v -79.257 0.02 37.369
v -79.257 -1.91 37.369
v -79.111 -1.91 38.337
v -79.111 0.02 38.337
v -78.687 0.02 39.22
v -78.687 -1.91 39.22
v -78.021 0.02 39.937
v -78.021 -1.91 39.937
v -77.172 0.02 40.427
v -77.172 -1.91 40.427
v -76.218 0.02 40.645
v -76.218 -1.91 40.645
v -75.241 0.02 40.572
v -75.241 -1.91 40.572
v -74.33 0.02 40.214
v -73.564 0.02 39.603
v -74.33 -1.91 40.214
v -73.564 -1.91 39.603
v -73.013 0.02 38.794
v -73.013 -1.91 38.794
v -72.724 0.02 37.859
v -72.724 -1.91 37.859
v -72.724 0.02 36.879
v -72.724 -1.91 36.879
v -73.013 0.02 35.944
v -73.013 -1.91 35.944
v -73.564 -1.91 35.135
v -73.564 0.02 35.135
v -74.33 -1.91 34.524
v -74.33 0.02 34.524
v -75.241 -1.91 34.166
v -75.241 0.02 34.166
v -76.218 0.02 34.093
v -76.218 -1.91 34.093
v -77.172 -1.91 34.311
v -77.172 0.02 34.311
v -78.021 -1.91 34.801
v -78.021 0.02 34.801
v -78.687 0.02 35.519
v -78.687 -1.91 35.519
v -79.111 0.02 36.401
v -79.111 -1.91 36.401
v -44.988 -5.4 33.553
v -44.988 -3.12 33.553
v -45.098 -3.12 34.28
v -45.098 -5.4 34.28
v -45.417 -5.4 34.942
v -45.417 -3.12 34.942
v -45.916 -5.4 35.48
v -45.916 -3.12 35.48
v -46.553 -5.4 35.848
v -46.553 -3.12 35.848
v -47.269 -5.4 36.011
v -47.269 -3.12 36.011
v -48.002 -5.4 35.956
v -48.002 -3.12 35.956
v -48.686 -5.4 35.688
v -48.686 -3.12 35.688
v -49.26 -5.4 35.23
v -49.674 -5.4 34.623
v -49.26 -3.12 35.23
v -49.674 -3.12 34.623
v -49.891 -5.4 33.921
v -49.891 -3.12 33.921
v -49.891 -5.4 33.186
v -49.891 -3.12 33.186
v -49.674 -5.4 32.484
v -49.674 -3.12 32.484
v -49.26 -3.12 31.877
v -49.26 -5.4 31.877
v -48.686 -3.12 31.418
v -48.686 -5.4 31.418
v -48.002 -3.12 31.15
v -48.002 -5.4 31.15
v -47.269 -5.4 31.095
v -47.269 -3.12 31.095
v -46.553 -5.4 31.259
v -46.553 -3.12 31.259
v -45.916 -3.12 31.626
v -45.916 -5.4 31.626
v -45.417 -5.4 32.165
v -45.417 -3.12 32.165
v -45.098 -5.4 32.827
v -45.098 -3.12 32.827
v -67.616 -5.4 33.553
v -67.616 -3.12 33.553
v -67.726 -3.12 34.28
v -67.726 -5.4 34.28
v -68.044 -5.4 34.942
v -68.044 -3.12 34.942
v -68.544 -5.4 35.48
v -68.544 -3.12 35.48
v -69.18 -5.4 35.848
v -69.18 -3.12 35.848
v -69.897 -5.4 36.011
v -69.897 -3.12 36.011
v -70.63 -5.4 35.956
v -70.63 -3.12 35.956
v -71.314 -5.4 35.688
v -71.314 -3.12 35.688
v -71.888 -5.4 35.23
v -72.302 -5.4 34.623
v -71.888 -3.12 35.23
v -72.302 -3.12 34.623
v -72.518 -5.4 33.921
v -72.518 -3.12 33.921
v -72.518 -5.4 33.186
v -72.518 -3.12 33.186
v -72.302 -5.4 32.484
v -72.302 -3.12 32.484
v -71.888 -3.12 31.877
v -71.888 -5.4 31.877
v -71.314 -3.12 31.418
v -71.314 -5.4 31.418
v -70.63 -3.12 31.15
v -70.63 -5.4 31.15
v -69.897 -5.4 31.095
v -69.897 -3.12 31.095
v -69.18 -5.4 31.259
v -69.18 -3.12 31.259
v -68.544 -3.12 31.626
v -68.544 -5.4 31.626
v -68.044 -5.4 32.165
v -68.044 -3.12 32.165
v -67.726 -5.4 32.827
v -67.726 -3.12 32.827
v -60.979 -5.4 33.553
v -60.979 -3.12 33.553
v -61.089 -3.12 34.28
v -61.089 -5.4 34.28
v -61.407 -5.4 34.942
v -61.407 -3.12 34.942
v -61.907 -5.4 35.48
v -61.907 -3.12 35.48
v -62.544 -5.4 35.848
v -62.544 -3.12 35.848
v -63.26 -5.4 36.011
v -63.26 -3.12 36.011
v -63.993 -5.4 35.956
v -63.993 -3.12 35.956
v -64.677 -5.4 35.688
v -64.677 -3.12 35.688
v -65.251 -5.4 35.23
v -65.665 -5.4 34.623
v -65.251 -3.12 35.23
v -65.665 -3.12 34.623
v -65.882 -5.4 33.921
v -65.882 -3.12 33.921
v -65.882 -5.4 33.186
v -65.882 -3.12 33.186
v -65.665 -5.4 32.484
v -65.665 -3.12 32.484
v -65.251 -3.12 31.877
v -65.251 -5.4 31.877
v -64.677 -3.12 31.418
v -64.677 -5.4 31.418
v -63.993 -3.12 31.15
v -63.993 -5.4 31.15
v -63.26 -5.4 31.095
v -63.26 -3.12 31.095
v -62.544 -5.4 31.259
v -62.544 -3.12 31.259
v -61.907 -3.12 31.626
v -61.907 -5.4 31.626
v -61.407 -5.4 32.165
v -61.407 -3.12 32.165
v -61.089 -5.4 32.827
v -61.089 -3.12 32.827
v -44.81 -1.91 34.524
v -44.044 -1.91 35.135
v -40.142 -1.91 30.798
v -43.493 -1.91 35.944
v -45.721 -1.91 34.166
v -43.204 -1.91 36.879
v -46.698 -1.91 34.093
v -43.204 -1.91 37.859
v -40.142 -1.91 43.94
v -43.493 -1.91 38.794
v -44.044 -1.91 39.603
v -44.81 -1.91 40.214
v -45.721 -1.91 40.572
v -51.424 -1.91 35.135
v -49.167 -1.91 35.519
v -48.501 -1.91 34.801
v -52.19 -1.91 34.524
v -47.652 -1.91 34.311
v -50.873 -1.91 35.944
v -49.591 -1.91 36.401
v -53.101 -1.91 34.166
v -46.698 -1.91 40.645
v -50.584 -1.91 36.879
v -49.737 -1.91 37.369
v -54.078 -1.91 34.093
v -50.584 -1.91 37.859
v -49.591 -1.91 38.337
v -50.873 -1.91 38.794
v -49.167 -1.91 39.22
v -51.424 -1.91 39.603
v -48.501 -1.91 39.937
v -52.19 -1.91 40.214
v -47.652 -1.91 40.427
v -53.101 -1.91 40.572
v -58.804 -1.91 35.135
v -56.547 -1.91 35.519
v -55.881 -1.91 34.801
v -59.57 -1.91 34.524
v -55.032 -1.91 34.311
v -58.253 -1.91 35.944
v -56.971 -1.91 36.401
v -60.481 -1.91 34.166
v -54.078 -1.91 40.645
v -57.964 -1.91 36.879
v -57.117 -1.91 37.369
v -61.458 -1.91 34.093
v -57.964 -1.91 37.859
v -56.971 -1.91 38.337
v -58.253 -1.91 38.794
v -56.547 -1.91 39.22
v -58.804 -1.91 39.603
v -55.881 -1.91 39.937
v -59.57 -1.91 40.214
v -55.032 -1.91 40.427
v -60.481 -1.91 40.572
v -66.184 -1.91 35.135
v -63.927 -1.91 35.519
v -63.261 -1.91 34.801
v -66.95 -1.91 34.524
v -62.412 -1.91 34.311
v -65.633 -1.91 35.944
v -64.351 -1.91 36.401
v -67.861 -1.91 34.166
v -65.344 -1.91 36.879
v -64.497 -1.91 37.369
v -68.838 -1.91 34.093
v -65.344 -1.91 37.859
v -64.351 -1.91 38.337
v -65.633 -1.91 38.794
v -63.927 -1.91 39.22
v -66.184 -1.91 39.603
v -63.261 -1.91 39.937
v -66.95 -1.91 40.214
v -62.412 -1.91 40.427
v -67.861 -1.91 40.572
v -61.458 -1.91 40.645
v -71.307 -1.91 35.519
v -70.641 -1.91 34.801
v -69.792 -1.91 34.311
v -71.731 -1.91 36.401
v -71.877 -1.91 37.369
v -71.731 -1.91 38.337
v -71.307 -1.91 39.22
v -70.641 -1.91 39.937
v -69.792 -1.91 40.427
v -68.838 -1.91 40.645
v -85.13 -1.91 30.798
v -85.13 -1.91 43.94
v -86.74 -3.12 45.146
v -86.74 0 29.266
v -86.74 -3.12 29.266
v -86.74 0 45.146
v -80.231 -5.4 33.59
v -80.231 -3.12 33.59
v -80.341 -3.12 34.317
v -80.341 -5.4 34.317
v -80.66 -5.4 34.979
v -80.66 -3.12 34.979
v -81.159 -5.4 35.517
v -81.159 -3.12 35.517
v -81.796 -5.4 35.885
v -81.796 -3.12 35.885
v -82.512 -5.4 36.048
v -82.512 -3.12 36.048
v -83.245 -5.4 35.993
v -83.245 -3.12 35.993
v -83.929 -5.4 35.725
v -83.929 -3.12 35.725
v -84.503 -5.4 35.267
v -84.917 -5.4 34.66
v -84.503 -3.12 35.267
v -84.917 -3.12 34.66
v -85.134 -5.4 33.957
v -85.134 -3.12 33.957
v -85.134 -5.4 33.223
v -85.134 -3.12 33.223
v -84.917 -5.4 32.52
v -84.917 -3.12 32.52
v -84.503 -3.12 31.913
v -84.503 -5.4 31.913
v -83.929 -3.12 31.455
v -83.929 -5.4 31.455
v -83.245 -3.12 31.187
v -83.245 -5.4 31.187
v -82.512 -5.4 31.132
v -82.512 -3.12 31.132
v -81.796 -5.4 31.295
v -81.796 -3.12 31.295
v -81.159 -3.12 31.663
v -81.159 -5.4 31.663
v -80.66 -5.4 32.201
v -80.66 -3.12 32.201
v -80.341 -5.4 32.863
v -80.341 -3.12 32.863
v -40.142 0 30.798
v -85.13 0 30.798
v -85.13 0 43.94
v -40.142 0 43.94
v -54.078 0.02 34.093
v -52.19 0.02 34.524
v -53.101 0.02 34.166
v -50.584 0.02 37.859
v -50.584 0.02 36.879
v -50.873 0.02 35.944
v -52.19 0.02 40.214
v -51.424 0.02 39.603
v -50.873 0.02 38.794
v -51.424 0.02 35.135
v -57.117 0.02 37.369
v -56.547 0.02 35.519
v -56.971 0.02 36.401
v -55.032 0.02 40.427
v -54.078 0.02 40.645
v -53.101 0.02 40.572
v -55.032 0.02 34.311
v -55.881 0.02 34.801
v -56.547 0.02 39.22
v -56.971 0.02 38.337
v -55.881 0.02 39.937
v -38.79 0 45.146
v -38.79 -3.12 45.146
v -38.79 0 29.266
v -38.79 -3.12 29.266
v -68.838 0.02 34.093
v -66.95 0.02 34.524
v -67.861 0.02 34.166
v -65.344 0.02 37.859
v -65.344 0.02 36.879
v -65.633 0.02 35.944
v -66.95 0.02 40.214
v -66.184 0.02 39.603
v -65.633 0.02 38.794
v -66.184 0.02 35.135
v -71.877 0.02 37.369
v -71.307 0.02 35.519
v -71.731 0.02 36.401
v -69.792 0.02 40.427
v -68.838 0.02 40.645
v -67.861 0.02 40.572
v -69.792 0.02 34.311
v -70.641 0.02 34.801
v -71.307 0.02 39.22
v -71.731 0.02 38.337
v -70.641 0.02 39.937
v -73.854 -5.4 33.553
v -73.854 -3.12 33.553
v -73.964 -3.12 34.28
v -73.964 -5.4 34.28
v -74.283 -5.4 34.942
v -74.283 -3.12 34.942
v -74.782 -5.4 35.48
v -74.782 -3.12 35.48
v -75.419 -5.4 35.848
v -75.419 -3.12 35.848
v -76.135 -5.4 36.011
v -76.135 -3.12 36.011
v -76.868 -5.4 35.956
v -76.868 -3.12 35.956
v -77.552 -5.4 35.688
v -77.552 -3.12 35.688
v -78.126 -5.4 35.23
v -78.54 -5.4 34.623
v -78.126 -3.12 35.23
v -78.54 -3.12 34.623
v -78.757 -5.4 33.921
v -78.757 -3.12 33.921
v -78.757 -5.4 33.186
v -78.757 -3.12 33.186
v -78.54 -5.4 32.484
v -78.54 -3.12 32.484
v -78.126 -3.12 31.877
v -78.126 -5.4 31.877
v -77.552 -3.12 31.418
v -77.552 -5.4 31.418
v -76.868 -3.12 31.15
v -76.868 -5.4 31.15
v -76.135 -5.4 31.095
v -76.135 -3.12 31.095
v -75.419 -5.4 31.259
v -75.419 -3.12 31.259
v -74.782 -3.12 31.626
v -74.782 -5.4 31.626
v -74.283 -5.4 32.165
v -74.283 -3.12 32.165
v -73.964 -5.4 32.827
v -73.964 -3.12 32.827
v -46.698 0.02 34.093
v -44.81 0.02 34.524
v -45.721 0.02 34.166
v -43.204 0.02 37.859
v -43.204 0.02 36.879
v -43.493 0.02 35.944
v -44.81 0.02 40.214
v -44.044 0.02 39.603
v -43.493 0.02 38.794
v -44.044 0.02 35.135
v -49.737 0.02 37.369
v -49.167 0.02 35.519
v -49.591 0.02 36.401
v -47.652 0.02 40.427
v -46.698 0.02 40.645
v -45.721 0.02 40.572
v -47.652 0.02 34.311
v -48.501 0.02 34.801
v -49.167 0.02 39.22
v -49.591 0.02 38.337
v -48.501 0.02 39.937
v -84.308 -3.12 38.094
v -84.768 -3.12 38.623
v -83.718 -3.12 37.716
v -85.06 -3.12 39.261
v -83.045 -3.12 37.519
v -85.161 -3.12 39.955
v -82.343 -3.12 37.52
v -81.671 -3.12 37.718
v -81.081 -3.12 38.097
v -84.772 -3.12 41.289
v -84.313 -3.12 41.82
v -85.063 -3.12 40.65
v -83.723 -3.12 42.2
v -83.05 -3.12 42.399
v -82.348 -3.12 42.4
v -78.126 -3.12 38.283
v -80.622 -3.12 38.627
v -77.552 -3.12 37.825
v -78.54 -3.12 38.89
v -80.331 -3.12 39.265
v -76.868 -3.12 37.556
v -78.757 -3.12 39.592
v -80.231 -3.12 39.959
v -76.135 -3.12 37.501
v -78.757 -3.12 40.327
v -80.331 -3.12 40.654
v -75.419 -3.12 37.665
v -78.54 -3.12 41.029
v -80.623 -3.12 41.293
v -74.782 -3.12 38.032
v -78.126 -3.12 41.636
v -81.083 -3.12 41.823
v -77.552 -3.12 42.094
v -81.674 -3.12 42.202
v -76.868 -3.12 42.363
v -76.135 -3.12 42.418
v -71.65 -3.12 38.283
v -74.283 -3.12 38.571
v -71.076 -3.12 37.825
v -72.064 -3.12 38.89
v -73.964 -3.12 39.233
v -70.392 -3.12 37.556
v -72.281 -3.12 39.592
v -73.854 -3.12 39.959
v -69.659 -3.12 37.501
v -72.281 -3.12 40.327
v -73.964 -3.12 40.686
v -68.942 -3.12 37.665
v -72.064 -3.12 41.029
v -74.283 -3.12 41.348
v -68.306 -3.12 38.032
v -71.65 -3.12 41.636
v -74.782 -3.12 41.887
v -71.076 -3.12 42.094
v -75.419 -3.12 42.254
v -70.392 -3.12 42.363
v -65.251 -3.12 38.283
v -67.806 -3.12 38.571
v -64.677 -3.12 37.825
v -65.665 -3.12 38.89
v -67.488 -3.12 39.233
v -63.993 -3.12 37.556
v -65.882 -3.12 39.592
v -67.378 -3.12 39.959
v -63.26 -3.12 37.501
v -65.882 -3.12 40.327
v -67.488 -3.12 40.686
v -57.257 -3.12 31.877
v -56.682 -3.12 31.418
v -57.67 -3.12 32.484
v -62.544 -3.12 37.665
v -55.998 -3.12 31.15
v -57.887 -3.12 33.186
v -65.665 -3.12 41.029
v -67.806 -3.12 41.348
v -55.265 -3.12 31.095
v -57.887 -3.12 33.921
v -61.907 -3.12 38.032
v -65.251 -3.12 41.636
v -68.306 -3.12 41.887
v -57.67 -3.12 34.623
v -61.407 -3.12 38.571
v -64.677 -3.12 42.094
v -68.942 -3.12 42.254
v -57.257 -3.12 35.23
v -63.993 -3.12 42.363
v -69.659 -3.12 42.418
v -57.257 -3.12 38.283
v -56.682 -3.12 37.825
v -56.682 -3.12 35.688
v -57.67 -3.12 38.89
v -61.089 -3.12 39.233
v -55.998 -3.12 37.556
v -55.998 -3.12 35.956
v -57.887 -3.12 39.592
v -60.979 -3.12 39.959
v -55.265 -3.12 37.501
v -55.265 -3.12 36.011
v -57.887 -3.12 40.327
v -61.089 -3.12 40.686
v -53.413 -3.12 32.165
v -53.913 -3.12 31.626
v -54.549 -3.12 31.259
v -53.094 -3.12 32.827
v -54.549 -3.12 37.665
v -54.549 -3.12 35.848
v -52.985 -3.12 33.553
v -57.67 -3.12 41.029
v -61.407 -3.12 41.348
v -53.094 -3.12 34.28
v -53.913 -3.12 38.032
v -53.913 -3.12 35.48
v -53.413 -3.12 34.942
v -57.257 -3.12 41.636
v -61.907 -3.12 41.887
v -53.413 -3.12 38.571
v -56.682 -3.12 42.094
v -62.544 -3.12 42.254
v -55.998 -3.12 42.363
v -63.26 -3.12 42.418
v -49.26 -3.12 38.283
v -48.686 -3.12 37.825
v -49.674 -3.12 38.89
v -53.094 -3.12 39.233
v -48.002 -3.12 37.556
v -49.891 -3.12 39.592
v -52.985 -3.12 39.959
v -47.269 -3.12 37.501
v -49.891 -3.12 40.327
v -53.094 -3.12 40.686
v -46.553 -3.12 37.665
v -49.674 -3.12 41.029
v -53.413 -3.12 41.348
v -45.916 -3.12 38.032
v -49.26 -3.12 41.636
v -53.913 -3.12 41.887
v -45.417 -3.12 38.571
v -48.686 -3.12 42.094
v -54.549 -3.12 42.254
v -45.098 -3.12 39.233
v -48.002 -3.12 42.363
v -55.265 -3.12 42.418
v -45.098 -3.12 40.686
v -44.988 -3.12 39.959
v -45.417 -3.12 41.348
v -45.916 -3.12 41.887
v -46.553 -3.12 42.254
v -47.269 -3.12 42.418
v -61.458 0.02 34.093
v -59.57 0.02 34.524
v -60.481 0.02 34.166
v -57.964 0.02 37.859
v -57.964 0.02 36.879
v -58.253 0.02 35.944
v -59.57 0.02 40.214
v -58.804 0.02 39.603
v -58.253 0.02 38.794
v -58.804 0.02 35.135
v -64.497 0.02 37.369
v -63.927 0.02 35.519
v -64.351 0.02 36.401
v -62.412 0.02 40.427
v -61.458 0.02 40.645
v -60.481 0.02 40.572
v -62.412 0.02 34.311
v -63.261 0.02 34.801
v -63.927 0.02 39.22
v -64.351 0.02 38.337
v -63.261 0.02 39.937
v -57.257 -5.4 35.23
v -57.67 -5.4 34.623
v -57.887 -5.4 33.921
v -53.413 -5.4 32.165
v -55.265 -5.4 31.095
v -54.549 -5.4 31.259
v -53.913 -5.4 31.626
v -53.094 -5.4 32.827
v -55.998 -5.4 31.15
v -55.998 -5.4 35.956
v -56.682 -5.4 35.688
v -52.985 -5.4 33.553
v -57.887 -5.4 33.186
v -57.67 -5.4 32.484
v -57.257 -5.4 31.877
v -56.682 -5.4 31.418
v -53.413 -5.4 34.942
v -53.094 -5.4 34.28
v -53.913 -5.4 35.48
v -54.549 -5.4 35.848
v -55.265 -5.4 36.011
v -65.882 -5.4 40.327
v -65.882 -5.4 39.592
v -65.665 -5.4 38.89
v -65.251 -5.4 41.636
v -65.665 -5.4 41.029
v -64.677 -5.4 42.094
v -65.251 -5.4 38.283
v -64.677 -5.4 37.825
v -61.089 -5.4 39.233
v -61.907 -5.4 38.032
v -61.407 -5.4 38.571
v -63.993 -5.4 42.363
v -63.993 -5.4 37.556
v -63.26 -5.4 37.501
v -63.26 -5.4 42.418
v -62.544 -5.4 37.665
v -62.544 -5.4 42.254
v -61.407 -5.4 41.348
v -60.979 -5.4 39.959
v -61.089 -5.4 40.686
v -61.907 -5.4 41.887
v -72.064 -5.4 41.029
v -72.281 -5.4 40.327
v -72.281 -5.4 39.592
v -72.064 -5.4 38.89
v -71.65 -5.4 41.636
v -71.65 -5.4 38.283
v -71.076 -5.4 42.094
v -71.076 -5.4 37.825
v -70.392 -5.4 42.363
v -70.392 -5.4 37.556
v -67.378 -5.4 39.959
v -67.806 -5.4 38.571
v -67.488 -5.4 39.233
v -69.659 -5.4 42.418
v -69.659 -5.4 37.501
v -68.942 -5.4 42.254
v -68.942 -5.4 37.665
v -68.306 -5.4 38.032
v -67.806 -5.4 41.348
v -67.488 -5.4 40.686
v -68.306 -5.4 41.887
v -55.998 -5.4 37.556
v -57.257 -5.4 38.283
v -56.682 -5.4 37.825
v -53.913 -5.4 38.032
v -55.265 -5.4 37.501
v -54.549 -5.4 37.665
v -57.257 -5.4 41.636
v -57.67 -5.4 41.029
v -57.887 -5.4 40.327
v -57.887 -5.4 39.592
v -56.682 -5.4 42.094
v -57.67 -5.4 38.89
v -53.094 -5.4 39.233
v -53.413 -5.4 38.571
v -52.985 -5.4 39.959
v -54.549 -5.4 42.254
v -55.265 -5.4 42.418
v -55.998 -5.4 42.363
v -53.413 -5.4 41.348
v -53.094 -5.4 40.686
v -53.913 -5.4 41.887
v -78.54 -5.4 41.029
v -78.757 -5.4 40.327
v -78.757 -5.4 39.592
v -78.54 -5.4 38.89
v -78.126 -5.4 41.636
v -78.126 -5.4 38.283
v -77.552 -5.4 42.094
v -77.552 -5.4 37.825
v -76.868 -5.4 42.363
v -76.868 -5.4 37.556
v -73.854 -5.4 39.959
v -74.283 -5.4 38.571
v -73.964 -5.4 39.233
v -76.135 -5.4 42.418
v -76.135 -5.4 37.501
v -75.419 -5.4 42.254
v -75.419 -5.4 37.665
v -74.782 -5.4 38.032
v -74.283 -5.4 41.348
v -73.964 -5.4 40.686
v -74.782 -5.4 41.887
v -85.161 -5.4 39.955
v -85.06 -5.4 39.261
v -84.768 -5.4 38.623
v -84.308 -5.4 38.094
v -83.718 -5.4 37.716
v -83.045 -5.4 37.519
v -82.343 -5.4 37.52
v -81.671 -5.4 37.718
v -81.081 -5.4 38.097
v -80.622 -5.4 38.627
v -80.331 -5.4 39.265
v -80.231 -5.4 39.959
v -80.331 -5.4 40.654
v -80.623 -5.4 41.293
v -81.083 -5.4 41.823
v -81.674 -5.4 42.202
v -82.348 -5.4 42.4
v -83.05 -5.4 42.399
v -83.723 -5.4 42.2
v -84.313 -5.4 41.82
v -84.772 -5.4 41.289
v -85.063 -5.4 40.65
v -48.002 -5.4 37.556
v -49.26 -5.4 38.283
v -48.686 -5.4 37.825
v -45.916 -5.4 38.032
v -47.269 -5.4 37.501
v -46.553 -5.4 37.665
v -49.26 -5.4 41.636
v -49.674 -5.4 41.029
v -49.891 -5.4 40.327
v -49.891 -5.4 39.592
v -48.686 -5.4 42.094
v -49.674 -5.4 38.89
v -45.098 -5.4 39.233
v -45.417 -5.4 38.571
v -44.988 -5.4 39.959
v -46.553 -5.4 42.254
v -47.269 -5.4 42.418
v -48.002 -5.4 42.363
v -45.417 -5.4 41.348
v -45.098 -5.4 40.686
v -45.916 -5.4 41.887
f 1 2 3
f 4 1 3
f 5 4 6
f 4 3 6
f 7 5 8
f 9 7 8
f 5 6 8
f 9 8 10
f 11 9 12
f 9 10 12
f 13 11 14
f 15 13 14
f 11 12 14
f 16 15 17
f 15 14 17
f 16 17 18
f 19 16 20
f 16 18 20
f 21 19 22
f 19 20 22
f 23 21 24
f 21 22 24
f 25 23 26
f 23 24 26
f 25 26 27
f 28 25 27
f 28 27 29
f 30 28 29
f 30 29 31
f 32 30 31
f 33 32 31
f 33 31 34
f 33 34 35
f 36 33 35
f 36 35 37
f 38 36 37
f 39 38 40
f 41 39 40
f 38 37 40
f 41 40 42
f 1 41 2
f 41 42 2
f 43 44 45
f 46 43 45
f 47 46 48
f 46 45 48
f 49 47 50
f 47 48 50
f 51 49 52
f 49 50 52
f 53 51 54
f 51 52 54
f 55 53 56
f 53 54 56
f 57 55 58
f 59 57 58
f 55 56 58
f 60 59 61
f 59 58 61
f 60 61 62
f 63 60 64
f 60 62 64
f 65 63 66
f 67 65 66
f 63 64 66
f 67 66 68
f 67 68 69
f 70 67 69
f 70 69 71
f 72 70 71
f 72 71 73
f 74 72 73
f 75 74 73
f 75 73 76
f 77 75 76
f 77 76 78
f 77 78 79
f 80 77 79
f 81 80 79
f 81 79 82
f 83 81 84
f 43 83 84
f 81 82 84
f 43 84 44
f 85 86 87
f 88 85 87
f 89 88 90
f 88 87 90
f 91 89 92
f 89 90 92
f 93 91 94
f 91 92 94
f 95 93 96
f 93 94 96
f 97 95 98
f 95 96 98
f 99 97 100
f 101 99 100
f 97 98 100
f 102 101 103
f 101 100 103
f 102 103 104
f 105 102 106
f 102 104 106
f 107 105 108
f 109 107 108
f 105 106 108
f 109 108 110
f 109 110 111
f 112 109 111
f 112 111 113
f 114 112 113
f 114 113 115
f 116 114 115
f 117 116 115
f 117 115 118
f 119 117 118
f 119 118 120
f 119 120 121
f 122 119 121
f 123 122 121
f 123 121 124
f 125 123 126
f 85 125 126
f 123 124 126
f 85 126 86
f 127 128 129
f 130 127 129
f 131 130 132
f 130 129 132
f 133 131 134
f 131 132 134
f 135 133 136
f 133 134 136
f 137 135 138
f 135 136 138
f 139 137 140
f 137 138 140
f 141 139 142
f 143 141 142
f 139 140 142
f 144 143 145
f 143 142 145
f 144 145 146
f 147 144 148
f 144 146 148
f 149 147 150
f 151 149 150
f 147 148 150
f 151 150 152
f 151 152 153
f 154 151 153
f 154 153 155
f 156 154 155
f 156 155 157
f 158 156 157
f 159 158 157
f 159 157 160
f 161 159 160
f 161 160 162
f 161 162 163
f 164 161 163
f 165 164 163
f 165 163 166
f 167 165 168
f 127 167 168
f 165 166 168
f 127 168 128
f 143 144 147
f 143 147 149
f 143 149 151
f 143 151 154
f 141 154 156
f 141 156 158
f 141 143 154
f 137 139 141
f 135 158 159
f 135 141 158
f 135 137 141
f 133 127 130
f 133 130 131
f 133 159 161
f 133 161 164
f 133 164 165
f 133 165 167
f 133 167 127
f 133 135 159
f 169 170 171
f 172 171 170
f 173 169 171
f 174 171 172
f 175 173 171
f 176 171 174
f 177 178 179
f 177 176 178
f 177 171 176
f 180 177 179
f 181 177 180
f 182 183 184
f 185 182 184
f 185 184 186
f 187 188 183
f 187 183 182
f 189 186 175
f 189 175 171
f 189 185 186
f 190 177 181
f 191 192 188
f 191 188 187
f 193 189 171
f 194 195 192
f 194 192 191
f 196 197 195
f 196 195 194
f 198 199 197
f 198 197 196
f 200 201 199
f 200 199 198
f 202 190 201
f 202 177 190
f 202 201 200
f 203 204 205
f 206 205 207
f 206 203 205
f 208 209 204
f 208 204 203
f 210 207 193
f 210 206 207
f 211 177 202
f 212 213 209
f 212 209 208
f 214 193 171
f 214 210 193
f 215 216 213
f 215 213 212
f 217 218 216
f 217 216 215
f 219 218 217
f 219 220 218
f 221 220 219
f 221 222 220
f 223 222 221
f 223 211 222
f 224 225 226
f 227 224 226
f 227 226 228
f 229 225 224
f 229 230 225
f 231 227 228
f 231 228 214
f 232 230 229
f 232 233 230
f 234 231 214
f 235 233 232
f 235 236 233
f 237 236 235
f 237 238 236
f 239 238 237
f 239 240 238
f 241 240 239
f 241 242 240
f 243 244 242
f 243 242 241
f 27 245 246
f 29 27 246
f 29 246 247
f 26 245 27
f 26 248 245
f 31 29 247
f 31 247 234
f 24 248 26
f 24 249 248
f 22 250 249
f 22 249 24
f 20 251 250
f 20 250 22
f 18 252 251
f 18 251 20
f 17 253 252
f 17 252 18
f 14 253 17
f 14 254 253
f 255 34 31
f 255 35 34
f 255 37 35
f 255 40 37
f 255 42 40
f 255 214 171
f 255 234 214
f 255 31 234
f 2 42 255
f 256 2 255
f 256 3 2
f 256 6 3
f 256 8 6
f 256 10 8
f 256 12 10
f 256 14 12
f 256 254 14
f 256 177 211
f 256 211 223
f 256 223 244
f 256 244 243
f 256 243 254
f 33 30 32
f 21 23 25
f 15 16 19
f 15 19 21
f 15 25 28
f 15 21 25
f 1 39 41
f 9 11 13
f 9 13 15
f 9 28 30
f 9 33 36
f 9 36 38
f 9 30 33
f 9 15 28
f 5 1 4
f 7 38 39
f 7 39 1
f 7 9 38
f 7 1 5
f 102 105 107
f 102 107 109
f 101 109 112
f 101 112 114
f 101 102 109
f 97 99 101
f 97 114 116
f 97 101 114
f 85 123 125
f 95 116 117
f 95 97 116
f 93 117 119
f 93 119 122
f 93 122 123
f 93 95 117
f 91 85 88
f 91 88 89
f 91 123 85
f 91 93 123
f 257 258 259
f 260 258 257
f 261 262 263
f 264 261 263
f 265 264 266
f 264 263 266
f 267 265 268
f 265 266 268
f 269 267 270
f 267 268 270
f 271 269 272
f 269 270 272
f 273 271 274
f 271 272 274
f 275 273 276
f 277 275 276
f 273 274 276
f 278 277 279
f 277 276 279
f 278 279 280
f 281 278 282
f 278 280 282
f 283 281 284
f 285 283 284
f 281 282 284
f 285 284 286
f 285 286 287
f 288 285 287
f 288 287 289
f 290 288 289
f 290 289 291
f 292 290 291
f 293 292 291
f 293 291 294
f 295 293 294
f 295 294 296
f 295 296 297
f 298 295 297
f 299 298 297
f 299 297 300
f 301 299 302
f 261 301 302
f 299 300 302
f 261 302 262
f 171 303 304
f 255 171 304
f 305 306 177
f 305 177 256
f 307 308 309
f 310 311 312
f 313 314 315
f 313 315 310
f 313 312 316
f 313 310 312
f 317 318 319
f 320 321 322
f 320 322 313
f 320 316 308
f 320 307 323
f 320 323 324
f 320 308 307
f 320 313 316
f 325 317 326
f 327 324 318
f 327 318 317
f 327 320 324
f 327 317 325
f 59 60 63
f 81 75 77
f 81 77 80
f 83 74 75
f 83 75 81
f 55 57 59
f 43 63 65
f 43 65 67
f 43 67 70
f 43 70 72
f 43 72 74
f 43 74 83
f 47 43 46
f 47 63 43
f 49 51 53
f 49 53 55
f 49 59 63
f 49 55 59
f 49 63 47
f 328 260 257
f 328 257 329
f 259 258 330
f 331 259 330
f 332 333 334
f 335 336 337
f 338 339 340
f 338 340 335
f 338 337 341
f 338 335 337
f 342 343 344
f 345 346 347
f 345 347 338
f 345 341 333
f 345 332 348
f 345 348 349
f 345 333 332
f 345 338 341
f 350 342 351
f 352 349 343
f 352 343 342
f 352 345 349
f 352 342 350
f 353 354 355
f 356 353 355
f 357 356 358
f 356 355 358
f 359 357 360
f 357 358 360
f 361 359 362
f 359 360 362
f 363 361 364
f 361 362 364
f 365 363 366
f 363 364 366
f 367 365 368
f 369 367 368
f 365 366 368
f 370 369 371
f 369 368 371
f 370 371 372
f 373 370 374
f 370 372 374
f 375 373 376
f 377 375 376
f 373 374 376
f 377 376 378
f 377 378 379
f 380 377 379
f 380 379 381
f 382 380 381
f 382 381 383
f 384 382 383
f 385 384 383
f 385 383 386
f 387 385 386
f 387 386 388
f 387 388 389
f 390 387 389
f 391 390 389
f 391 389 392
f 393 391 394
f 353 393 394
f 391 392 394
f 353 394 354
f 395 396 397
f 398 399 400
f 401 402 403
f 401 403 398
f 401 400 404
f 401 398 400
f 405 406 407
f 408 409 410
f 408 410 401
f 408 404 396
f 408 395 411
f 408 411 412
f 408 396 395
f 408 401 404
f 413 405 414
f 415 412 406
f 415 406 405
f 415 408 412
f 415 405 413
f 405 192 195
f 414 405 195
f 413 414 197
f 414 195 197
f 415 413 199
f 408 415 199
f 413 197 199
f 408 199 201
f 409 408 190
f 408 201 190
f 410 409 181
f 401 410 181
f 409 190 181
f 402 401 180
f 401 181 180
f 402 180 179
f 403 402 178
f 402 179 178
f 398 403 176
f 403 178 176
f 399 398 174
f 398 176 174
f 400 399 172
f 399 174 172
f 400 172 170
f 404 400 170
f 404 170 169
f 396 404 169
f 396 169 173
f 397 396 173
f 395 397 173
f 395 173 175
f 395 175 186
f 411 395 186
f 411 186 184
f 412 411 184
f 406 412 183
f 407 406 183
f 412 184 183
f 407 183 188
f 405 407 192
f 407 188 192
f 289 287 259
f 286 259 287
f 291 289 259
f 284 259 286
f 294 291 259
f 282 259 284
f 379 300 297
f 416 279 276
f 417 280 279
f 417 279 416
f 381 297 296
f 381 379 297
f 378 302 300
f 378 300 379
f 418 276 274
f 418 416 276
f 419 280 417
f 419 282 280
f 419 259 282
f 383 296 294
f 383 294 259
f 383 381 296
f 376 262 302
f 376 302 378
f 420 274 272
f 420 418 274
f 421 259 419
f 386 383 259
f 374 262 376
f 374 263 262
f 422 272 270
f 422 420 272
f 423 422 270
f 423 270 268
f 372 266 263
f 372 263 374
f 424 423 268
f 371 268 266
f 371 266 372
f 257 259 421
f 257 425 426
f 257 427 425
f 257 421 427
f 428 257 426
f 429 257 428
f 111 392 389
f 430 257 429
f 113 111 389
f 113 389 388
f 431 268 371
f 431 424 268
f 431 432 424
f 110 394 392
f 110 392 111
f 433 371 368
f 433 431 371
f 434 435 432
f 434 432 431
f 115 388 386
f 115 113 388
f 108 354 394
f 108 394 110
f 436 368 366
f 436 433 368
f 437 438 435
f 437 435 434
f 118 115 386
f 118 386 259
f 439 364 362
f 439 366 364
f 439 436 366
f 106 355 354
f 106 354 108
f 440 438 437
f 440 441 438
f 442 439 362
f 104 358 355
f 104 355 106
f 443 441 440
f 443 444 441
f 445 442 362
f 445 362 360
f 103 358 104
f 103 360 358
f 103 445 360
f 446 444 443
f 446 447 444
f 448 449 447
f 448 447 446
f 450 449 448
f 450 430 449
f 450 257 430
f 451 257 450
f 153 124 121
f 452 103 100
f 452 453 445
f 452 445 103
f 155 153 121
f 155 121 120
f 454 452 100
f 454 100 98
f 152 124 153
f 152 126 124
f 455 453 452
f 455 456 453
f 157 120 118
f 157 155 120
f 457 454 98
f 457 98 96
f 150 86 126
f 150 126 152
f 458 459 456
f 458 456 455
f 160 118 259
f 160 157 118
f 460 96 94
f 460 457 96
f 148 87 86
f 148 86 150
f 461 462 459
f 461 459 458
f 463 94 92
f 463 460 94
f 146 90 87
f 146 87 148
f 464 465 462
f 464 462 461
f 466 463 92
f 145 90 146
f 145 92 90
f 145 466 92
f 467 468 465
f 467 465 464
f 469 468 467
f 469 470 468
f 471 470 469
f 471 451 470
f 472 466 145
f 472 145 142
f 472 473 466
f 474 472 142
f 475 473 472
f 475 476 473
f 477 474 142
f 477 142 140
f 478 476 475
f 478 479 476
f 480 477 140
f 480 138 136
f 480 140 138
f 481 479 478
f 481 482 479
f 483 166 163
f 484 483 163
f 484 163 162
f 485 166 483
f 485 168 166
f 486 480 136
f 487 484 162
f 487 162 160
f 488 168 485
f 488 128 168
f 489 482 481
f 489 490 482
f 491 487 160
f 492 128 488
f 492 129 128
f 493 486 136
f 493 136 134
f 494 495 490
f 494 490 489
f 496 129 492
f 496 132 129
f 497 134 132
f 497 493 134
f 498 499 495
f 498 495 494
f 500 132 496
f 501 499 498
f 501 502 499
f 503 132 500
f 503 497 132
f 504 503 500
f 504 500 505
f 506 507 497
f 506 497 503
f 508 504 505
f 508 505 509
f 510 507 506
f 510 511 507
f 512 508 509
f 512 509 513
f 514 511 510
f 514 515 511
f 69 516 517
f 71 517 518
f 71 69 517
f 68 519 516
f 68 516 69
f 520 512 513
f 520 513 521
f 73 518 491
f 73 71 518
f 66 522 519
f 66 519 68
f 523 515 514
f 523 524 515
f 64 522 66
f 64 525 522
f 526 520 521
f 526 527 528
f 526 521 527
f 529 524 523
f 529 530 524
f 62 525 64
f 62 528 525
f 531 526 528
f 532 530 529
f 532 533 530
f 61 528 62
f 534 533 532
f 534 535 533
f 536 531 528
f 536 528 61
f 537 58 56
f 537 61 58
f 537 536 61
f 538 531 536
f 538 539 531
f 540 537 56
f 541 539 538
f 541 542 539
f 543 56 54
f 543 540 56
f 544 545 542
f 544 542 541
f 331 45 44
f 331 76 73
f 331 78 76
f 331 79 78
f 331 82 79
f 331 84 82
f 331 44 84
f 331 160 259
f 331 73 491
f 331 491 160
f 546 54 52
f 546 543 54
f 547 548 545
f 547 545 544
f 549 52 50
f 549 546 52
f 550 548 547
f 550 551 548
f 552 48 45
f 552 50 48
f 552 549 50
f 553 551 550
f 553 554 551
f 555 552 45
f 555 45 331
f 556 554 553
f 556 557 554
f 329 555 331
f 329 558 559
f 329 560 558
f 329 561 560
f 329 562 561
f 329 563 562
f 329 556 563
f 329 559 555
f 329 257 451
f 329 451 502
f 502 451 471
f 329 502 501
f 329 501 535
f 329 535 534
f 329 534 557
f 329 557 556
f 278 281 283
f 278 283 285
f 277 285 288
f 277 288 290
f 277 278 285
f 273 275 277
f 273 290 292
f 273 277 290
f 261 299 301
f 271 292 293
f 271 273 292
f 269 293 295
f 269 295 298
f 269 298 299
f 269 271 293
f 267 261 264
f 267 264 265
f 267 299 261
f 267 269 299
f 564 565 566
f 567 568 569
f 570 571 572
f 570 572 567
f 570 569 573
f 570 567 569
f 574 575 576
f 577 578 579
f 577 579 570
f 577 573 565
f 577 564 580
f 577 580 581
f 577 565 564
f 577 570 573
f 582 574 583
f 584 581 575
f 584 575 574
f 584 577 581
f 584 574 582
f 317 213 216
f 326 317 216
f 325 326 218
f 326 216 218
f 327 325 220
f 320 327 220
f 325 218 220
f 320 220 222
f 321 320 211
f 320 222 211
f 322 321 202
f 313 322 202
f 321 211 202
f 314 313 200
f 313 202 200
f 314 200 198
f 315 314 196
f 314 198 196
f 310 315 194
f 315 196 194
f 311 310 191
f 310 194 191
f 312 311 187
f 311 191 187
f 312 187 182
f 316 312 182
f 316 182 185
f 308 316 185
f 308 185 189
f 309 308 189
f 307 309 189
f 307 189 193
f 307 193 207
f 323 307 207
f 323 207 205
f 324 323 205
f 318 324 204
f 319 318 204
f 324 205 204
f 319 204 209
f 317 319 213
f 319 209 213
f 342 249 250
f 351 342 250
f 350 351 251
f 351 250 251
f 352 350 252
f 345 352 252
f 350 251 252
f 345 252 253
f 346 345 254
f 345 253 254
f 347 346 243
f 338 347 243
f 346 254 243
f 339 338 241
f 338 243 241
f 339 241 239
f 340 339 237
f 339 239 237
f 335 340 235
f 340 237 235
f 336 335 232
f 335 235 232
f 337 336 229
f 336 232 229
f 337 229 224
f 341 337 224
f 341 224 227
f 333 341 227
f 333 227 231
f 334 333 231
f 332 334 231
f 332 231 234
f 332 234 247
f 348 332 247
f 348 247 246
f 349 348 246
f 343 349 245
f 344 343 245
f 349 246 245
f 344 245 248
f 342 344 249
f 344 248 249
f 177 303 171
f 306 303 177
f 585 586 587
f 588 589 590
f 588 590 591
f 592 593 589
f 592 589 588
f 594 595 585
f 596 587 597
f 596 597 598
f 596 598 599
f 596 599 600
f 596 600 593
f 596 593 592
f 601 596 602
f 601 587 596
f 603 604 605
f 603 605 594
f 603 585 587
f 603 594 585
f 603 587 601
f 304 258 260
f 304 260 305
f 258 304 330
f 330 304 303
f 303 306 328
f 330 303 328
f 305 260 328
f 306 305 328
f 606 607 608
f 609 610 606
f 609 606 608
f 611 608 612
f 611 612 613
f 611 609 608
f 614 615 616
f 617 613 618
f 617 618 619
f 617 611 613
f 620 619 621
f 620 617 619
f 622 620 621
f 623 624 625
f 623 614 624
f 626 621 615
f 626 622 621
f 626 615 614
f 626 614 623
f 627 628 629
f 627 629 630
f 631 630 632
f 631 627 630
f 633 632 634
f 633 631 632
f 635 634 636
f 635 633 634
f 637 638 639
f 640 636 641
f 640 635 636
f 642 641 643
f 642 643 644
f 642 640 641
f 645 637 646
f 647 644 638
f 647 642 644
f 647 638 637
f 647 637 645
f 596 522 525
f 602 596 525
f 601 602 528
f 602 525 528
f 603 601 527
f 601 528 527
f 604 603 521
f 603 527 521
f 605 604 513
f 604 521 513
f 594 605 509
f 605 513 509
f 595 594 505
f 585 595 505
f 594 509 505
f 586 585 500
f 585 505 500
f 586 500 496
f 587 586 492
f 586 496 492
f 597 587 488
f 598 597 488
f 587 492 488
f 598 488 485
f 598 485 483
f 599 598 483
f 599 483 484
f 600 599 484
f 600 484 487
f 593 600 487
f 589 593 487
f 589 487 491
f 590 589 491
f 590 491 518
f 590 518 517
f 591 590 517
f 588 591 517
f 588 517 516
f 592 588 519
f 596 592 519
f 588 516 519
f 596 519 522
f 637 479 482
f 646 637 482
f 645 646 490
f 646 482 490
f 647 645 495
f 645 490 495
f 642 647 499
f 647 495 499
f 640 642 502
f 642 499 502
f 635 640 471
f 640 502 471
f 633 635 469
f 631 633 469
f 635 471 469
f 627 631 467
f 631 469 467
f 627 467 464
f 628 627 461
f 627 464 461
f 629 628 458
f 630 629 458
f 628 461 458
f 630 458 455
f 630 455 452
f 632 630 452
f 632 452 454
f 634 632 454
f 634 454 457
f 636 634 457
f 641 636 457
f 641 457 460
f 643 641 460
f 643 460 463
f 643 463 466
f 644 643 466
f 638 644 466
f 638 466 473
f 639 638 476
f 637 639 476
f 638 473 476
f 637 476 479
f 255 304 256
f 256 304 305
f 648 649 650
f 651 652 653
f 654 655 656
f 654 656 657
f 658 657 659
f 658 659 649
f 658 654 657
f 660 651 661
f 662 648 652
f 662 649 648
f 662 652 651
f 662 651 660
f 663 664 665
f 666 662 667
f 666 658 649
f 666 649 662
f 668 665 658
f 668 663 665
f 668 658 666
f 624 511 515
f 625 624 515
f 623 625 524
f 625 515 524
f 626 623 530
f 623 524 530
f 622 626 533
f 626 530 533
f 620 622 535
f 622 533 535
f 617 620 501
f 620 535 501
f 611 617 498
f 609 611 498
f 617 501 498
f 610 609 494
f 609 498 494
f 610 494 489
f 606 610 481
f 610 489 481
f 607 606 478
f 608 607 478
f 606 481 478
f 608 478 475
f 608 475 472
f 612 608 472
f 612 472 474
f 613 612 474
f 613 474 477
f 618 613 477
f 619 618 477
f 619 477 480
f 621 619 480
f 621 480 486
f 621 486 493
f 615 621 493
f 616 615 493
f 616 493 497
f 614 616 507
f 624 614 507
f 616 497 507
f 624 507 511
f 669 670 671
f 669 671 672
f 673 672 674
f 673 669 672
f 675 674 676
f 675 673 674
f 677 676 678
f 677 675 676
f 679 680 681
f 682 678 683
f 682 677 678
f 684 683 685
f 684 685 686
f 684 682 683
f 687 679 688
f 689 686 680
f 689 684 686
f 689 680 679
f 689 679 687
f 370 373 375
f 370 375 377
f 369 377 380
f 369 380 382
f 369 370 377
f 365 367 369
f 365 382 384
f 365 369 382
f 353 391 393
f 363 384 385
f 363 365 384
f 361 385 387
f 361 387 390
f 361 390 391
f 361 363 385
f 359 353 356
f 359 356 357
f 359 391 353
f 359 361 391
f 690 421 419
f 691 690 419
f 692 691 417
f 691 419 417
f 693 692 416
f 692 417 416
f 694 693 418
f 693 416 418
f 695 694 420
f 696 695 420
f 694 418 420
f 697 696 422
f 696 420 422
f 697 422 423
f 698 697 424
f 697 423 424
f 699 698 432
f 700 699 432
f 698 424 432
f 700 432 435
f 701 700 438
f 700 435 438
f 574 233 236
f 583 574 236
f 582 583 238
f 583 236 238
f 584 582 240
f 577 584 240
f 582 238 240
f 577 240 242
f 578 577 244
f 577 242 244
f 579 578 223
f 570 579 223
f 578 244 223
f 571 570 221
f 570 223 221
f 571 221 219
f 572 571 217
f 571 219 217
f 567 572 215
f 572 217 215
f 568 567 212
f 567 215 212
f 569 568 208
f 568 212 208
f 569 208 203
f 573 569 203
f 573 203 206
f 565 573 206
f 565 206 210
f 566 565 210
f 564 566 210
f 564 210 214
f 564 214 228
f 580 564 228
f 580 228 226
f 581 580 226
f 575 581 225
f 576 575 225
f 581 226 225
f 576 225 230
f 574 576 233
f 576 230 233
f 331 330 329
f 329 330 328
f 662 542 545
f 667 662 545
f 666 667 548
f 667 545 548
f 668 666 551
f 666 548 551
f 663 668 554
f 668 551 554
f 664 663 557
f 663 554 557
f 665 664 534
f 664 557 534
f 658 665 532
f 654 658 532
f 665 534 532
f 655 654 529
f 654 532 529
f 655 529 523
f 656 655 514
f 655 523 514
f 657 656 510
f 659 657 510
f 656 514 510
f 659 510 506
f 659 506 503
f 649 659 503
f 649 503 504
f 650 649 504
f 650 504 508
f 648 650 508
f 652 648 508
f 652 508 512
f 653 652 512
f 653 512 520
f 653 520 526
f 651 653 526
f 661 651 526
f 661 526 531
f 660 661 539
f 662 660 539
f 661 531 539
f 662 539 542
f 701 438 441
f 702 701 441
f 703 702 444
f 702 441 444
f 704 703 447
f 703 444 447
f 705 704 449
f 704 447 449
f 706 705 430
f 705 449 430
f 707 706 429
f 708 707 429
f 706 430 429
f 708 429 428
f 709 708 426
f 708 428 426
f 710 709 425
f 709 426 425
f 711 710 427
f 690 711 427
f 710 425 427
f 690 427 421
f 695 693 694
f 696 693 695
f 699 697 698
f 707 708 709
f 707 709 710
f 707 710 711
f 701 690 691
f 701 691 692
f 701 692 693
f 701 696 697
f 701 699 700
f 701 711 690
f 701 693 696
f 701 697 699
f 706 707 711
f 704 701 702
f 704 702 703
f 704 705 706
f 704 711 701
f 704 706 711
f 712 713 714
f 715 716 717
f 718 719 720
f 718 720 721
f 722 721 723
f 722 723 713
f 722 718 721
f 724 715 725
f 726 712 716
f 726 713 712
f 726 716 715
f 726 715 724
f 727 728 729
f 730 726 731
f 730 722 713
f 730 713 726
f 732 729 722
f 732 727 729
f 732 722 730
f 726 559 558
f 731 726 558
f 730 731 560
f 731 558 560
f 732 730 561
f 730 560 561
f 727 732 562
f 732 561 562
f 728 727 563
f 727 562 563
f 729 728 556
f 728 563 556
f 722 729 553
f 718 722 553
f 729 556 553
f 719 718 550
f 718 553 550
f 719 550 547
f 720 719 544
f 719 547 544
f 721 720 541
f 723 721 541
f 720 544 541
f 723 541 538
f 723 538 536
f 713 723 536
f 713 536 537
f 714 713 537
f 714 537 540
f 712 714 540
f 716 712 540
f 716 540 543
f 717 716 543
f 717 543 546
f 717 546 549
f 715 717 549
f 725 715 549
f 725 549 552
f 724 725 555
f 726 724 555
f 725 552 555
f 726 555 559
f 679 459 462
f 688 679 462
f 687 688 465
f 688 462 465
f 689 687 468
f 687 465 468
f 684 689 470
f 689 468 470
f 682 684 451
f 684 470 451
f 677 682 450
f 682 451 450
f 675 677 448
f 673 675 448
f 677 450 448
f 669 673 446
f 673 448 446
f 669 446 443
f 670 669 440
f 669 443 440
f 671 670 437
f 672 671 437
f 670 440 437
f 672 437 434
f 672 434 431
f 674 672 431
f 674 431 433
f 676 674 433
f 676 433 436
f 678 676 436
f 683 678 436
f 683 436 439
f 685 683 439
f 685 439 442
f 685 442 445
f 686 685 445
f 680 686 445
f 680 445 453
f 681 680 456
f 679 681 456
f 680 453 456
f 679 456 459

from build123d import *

# Parameters (mm, degrees)
F0_W     = 47.95
F0_H     = 15.88
F0_R     = 2.46
F1_DEPTH = 3.12
F3_R     = 2.465
F4_DEPTH = 2.28
F5_W     = 44.987634
F5_H     = 13.142811
F6_DEPTH = 1.91
F7_R     = 3.285
F8_DEPTH = 1.93


with BuildPart() as f1:
    # F0 (on Front) → F1 (new body)
    with BuildSketch(Plane.XZ):
        with Locations((-62.765208, 37.205729)):
            Rectangle(F0_W, F0_H)
        with Locations((-83.495483, 34.202196)):
            Circle(F0_R, mode=Mode.SUBTRACT)
        with Locations((-76.453662, 34.202196)):
            Circle(F0_R, mode=Mode.SUBTRACT)
        with Locations((-69.286012, 34.202196)):
            Circle(F0_R, mode=Mode.SUBTRACT)
        with Locations((-83.495483, 41.639235)):
            Circle(F0_R, mode=Mode.SUBTRACT)
        with Locations((-76.453662, 41.639235)):
            Circle(F0_R, mode=Mode.SUBTRACT)
        with Locations((-69.286012, 41.639235)):
            Circle(F0_R, mode=Mode.SUBTRACT)
        with Locations((-61.757147, 34.202196)):
            Circle(F0_R, mode=Mode.SUBTRACT)
        with Locations((-53.794272, 34.202196)):
            Circle(F0_R, mode=Mode.SUBTRACT)
        with Locations((-44.286012, 34.202196)):
            Circle(F0_R, mode=Mode.SUBTRACT)
        with Locations((-62.190687, 41.639235)):
            Circle(F0_R, mode=Mode.SUBTRACT)
        with Locations((-53.676993, 41.639235)):
            Circle(F0_R, mode=Mode.SUBTRACT)
        with Locations((-44.286012, 41.639235)):
            Circle(F0_R, mode=Mode.SUBTRACT)
        with Locations((-83.495483, 41.639235)):
            Circle(F0_R)
        with Locations((-83.495483, 34.202196)):
            Circle(F0_R)
        with Locations((-76.453662, 34.202196)):
            Circle(F0_R)
        with Locations((-76.453662, 41.639235)):
            Circle(F0_R)
        with Locations((-69.286012, 34.202196)):
            Circle(F0_R)
        with Locations((-69.286012, 41.639235)):
            Circle(F0_R)
        with Locations((-61.757147, 34.202196)):
            Circle(F0_R)
        with Locations((-62.190687, 41.639235)):
            Circle(F0_R)
        with Locations((-53.794272, 34.202196)):
            Circle(F0_R)
        with Locations((-53.676993, 41.639235)):
            Circle(F0_R)
        with Locations((-44.286012, 34.202196)):
            Circle(F0_R)
        with Locations((-44.286012, 41.639235)):
            Circle(F0_R)
    extrude(amount=F1_DEPTH)

    # F3 (on face) → F4 (join)
    with BuildSketch(Plane.XZ.offset(3.12)):
        with BuildLine():
            ThreePointArc((-85.161299, 39.95467), (-82.693921, 37.494436), (-80.231304, 39.959435))
            ThreePointArc((-80.231304, 39.959435), (-82.698686, 42.424434), (-85.161299, 39.95467))
        make_face()
        with Locations((-82.696304, 33.589986)):
            Circle(F3_R)
        with Locations((-76.319206, 39.959435)):
            Circle(F3_R)
        with Locations((-76.319206, 33.553134)):
            Circle(F3_R)
        with Locations((-69.843043, 39.959435)):
            Circle(F3_R)
        with Locations((-63.444085, 39.959435)):
            Circle(F3_R)
        with Locations((-55.449564, 39.959435)):
            Circle(F3_R)
        with Locations((-70.081018, 33.553134)):
            Circle(F3_R)
        with Locations((-63.444085, 33.553134)):
            Circle(F3_R)
        with Locations((-55.449564, 33.553134)):
            Circle(F3_R)
        with Locations((-47.453236, 33.553134)):
            Circle(F3_R)
        with Locations((-47.453236, 39.959435)):
            Circle(F3_R)
    extrude(amount=F4_DEPTH)

    # F5 (on face) → F6 (cut)
    with BuildSketch(Plane(origin=(0, 0, 0), x_dir=(-1, 0, 0), z_dir=(0, 1, 0))):
        with Locations((62.636159, 37.369034)):
            Rectangle(F5_W, F5_H)
    extrude(amount=-F6_DEPTH, mode=Mode.SUBTRACT)

    # F7 (on face) → F8 (join)
    with BuildSketch(Plane(origin=(0, -1.91, 0), x_dir=(-1, 0, 0), z_dir=(0, 1, 0))):
        with Locations((46.452342, 37.369034)):
            Circle(F7_R)
        with Locations((53.832342, 37.369034)):
            Circle(F7_R)
        with Locations((61.212342, 37.369034)):
            Circle(F7_R)
        with Locations((68.592342, 37.369034)):
            Circle(F7_R)
        with Locations((75.972342, 37.369034)):
            Circle(F7_R)
    extrude(amount=F8_DEPTH)


solid = f1.part
